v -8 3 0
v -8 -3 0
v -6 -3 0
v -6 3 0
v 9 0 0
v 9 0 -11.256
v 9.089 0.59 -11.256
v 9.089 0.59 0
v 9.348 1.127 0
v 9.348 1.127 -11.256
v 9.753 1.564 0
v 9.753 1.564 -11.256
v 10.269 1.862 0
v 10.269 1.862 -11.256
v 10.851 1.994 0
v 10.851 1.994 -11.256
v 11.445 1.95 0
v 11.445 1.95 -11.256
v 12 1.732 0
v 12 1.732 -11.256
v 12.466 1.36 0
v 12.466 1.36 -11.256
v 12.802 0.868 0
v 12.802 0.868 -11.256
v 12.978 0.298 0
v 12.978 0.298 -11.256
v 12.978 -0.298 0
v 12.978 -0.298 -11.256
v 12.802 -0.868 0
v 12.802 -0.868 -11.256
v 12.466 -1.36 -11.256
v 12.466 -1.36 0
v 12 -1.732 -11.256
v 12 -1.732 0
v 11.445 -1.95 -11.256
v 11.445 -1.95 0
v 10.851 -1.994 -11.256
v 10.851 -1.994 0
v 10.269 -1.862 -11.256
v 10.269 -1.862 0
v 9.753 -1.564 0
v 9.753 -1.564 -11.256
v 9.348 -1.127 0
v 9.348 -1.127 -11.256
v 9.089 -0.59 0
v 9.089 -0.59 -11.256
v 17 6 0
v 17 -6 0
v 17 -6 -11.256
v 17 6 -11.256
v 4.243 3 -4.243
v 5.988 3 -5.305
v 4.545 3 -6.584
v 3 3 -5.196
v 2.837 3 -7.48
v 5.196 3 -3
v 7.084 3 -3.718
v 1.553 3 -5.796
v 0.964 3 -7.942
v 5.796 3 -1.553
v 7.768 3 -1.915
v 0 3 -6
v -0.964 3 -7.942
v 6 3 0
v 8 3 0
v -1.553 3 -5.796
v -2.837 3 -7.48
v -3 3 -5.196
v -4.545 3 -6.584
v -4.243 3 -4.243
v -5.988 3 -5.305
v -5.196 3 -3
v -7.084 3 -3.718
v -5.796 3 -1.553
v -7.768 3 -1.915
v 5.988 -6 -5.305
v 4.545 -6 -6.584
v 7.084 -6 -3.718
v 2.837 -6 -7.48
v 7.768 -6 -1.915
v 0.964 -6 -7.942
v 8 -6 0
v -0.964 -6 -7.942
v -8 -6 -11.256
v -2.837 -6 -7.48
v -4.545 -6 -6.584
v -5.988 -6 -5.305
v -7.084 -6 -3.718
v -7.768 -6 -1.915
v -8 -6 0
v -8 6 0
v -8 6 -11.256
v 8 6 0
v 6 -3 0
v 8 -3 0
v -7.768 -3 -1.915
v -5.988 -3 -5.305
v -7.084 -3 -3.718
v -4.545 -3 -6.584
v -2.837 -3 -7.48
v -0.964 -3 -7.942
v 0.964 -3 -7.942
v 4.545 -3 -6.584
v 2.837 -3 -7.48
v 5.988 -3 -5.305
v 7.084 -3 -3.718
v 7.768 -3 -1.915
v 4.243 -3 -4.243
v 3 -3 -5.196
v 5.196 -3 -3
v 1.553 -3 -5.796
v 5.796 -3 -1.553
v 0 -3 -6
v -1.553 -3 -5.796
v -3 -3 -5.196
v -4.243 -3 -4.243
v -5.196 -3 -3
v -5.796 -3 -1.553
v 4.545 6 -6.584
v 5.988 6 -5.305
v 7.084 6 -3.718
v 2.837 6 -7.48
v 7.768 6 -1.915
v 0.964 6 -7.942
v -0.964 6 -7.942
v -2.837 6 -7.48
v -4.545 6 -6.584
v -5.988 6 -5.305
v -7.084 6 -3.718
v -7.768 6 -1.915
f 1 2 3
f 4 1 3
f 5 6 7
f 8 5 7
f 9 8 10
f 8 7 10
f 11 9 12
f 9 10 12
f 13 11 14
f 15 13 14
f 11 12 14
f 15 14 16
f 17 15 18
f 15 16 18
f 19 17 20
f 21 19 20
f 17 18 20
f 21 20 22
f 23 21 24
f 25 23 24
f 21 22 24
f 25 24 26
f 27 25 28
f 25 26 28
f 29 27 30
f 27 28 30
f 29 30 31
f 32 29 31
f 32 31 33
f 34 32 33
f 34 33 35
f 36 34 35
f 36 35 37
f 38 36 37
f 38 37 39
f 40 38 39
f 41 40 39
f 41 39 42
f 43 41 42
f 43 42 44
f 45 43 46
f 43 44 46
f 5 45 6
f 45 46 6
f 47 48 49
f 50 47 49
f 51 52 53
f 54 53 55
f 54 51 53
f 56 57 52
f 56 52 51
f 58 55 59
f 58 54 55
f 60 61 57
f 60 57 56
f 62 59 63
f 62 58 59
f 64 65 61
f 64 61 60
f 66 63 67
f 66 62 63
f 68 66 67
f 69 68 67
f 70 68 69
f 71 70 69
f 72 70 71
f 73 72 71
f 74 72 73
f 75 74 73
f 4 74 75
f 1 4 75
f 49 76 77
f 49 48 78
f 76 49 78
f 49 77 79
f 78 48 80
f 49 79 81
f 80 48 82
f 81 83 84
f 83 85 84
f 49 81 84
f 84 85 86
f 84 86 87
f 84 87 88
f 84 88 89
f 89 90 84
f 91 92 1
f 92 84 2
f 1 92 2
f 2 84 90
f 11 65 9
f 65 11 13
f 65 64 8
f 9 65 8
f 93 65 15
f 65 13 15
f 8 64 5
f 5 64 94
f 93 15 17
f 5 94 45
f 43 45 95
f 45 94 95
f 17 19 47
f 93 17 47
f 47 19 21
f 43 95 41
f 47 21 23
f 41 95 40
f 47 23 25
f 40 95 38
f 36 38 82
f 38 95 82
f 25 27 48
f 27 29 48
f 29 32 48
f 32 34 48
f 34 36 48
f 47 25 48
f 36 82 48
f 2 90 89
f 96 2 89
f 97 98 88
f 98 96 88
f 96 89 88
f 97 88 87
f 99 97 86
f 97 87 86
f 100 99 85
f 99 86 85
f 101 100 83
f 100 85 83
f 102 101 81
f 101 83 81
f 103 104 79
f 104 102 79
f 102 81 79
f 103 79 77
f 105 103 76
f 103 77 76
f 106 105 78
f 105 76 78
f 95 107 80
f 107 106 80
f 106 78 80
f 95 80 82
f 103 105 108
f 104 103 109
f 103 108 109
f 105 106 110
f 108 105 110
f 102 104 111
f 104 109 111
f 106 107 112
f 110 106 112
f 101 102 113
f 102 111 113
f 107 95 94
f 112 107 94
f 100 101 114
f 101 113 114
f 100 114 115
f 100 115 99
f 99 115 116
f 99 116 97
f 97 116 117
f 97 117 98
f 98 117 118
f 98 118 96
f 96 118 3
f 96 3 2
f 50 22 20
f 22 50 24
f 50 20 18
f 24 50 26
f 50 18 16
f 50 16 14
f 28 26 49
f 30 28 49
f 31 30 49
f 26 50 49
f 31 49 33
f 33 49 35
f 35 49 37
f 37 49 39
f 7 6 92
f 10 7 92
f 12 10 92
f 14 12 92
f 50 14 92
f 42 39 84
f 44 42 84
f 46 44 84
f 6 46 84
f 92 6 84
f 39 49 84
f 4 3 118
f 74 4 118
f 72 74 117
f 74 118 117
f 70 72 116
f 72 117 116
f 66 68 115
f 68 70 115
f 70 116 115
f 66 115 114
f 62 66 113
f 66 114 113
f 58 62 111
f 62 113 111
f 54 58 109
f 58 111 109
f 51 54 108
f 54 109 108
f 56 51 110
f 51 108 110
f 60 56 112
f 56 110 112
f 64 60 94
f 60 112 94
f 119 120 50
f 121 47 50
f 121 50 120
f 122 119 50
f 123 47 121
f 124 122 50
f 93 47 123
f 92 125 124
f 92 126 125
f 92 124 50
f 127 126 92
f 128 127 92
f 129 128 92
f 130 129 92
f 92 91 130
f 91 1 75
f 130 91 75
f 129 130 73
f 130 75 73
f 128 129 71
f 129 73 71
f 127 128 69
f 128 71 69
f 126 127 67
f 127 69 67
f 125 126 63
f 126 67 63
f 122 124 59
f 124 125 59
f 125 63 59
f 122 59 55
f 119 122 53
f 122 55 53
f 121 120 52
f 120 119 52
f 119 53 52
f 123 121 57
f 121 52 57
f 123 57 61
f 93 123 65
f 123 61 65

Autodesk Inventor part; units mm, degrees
ref_plane "YZ Plane" through (0, 0, 0) normal (1, 0, 0) x (0, 1, 0)
ref_plane "XZ Plane" through (0, 0, 0) normal (0, 1, 0) x (-1, 0, 0)
ref_plane "XY Plane" through (0, 0, 0) normal (0, 0, 1) x (1, 0, 0)
sketch "Sketch1" plane through (0, 0, 0) normal (0, 1, 0) x (-1, 0, 0)
  arc A0 (-6, 0) -> (6, 0) centre (0, 0) ccw
  arc A1 (-8, 0) -> (8, 0) centre (0, 0) ccw
  line L0 (-17, 0) -> (-17, -11.2563)
  line L1 (-17, -11.2563) -> (8, -11.2563)
  line L2 (8, -11.2563) -> (8, 0)
  line L3 (8, 0) -> (6, 0)
  line L4 (-6, 0) -> (-17, 0)
  line L5 (6, 0) -> (-6, 0) construction
  dimension "d0" = 12
  dimension "d1" = 16
  dimension "d2" = 8
  dimension "d3" = 9
extrude "Tykkelse" add sketch "Sketch1" along normal mid plane 12 contours A1 L2 L1 L0 L4
extrude "Lille cirkel" add sketch "Sketch1" along normal mid plane 6 contours A0 L3 A1 L4
sketch "Sketch2" plane through (17, 6, -11.2563) normal (0, 0, -1) x (-1, 0, 0)
  circle A0 centre (6, -6) radius 2
  line L0 (0, 0) -> (0, -12) projected
  line L1 (25, -12) -> (0, -12) projected
  point P0 (17, -6)
  dimension "d9" = 4
  dimension "d10" = 6
  dimension "d11" = 6
extrude "Monteringshul" cut sketch "Sketch2" against normal up to surface (11.2563 mm away)
properties part number "Holder"
